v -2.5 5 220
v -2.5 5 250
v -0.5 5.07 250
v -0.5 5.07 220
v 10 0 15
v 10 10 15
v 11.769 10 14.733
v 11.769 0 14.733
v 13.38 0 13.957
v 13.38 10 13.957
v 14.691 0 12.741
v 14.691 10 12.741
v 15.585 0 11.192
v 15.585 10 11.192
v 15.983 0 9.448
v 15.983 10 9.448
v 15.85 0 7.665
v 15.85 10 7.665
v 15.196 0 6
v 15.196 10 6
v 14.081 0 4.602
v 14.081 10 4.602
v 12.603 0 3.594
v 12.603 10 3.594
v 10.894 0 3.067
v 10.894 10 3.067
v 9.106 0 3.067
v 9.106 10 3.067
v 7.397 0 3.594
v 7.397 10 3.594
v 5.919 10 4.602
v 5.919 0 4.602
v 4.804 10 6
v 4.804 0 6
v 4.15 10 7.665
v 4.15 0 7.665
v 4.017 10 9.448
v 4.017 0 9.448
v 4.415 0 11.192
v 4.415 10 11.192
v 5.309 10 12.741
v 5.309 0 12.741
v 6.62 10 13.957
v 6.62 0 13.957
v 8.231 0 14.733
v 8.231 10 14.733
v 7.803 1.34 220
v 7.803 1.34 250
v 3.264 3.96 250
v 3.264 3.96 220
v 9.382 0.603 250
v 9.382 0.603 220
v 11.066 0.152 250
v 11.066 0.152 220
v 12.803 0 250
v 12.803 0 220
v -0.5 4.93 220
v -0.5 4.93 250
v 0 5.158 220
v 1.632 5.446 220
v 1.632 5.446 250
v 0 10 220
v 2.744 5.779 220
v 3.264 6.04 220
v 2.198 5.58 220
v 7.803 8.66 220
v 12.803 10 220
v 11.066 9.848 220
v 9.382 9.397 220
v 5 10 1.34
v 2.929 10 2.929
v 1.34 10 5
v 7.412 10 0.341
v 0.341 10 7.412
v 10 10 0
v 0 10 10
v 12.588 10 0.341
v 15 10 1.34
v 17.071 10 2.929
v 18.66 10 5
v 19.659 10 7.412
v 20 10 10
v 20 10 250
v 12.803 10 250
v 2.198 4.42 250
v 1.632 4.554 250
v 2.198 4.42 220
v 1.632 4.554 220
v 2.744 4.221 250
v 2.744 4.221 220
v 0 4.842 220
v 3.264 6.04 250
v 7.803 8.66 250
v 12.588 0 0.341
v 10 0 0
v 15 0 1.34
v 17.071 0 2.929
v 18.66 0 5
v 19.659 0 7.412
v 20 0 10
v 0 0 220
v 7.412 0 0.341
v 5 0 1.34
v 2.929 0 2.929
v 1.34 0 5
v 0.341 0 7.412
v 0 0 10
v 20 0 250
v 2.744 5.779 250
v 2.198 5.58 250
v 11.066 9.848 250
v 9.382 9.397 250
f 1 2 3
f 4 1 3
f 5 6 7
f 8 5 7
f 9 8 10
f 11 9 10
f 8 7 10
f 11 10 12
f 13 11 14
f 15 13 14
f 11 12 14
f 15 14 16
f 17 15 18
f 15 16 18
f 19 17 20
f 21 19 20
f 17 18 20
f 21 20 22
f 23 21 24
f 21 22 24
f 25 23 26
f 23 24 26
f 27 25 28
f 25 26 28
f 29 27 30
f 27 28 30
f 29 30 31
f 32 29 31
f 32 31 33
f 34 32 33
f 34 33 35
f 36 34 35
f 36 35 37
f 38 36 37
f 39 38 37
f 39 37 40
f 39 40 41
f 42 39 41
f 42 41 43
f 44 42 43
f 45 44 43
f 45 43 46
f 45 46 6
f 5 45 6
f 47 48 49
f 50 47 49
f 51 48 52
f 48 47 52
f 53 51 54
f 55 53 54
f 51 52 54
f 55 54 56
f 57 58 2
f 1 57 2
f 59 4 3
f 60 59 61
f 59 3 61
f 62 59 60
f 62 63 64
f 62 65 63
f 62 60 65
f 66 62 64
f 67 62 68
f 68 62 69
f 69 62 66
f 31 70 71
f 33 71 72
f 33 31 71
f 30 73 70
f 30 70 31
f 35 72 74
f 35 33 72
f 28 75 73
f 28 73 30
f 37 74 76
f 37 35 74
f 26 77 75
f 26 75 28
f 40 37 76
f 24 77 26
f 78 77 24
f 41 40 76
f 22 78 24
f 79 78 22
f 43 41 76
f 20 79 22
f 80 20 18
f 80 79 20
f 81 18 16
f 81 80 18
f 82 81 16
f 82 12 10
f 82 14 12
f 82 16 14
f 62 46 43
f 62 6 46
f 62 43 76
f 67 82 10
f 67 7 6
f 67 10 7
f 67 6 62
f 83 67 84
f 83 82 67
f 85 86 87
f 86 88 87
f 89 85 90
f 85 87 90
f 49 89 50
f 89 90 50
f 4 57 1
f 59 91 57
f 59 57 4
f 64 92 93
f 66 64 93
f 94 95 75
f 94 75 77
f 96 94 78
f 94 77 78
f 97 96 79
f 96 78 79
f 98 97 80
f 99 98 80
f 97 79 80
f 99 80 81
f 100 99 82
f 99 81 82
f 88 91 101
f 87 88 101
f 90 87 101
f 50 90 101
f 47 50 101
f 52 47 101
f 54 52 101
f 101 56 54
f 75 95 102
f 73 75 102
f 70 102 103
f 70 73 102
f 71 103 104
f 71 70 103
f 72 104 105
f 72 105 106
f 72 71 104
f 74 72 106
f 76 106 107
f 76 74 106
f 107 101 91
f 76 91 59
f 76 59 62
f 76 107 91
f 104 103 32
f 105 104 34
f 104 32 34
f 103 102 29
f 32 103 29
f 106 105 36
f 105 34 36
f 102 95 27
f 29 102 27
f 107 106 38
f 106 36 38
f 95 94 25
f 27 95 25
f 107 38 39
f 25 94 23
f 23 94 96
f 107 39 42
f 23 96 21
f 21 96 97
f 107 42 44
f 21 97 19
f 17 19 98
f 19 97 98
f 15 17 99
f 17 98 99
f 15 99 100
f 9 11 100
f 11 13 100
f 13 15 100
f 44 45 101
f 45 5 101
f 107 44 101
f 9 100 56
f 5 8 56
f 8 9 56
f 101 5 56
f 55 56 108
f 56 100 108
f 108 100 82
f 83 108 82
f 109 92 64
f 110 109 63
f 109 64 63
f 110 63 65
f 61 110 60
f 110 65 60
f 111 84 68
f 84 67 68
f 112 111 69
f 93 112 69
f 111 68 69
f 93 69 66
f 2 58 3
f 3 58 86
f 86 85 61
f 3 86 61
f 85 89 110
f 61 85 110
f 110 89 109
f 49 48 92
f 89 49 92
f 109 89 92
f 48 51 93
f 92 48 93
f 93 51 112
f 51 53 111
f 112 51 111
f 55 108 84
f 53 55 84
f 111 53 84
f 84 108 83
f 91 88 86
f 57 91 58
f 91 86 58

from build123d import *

# Parameters (mm, degrees)
SKETCH2_W           = 20
SKETCH2_H           = 10
BOSS_EXTRUDE1_DEPTH = 250
SKETCH3_R           = 6
CUT_EXTRUDE1_DEPTH  = 30
FILLET1_R           = 10
FILLET3_R           = 10
SKETCH4_W           = 30
SKETCH4_H           = 10
BOSS_EXTRUDE2_DEPTH = 2.5
CUT_EXTRUDE2_DEPTH  = 30
FILLET4_R           = 5
FILLET5_R           = 10


with BuildPart() as part:
    # Sketch2 → Boss-Extrude1 (new body)
    with BuildSketch(Plane.XY):
        with Locations((10, 5)):
            Rectangle(SKETCH2_W, SKETCH2_H)
    extrude(amount=BOSS_EXTRUDE1_DEPTH)

    # Sketch3 → Cut-Extrude1 (cut)
    with BuildSketch(Plane(origin=(0, 10, 0), x_dir=(1, 0, 0), z_dir=(0, 1, 0))):
        with Locations(Location((10, -9, 0), (0, 0, 270))):
            Circle(SKETCH3_R)
    extrude(amount=-CUT_EXTRUDE1_DEPTH, mode=Mode.SUBTRACT)

    # Fillet1
    fillet1_edges = [part.edges().sort_by_distance(p)[0] for p in [
        (20, 5, 0),
    ]]
    fillet(fillet1_edges, radius=FILLET1_R)

    # Fillet3
    fillet3_edges = [part.edges().sort_by_distance(p)[0] for p in [
        (0, 5, 0),
    ]]
    fillet(fillet3_edges, radius=FILLET3_R - 0.0001)  # a hair under: the kernel refuses the full size

    # Sketch4 → Boss-Extrude2 (add)
    with BuildSketch(Plane.ZY):
        with Locations((235, 5)):
            Rectangle(SKETCH4_W, SKETCH4_H)
    extrude(amount=BOSS_EXTRUDE2_DEPTH)

    # Sketch5 → Cut-Extrude2 (cut)
    with BuildSketch(Plane.XY.offset(250)):
        Polygon((-2.5, 10), (-2.5, 5), (-0.5, 5.069841539), (2.5, 5.598822481), (10.123063076, 10), align=None)
        Polygon((-0.5, 4.930158461), (-2.5, 5), (-2.5, 0), (10.123063076, 0), (2.5, 4.401177519), align=None)
    extrude(amount=-CUT_EXTRUDE2_DEPTH, mode=Mode.SUBTRACT)

    # Fillet4
    fillet4_edges = [part.edges().sort_by_distance(p)[0] for p in [
        (2.5, 5.598822481, 235),
        (2.5, 4.401177519, 235),
    ]]
    fillet(fillet4_edges, radius=FILLET4_R)

    # Fillet5
    fillet5_edges = [part.edges().sort_by_distance(p)[0] for p in [
        (10.123063076, 10, 235),
        (10.123063076, 0, 235),
    ]]
    fillet(fillet5_edges, radius=FILLET5_R)


solid = part.part
